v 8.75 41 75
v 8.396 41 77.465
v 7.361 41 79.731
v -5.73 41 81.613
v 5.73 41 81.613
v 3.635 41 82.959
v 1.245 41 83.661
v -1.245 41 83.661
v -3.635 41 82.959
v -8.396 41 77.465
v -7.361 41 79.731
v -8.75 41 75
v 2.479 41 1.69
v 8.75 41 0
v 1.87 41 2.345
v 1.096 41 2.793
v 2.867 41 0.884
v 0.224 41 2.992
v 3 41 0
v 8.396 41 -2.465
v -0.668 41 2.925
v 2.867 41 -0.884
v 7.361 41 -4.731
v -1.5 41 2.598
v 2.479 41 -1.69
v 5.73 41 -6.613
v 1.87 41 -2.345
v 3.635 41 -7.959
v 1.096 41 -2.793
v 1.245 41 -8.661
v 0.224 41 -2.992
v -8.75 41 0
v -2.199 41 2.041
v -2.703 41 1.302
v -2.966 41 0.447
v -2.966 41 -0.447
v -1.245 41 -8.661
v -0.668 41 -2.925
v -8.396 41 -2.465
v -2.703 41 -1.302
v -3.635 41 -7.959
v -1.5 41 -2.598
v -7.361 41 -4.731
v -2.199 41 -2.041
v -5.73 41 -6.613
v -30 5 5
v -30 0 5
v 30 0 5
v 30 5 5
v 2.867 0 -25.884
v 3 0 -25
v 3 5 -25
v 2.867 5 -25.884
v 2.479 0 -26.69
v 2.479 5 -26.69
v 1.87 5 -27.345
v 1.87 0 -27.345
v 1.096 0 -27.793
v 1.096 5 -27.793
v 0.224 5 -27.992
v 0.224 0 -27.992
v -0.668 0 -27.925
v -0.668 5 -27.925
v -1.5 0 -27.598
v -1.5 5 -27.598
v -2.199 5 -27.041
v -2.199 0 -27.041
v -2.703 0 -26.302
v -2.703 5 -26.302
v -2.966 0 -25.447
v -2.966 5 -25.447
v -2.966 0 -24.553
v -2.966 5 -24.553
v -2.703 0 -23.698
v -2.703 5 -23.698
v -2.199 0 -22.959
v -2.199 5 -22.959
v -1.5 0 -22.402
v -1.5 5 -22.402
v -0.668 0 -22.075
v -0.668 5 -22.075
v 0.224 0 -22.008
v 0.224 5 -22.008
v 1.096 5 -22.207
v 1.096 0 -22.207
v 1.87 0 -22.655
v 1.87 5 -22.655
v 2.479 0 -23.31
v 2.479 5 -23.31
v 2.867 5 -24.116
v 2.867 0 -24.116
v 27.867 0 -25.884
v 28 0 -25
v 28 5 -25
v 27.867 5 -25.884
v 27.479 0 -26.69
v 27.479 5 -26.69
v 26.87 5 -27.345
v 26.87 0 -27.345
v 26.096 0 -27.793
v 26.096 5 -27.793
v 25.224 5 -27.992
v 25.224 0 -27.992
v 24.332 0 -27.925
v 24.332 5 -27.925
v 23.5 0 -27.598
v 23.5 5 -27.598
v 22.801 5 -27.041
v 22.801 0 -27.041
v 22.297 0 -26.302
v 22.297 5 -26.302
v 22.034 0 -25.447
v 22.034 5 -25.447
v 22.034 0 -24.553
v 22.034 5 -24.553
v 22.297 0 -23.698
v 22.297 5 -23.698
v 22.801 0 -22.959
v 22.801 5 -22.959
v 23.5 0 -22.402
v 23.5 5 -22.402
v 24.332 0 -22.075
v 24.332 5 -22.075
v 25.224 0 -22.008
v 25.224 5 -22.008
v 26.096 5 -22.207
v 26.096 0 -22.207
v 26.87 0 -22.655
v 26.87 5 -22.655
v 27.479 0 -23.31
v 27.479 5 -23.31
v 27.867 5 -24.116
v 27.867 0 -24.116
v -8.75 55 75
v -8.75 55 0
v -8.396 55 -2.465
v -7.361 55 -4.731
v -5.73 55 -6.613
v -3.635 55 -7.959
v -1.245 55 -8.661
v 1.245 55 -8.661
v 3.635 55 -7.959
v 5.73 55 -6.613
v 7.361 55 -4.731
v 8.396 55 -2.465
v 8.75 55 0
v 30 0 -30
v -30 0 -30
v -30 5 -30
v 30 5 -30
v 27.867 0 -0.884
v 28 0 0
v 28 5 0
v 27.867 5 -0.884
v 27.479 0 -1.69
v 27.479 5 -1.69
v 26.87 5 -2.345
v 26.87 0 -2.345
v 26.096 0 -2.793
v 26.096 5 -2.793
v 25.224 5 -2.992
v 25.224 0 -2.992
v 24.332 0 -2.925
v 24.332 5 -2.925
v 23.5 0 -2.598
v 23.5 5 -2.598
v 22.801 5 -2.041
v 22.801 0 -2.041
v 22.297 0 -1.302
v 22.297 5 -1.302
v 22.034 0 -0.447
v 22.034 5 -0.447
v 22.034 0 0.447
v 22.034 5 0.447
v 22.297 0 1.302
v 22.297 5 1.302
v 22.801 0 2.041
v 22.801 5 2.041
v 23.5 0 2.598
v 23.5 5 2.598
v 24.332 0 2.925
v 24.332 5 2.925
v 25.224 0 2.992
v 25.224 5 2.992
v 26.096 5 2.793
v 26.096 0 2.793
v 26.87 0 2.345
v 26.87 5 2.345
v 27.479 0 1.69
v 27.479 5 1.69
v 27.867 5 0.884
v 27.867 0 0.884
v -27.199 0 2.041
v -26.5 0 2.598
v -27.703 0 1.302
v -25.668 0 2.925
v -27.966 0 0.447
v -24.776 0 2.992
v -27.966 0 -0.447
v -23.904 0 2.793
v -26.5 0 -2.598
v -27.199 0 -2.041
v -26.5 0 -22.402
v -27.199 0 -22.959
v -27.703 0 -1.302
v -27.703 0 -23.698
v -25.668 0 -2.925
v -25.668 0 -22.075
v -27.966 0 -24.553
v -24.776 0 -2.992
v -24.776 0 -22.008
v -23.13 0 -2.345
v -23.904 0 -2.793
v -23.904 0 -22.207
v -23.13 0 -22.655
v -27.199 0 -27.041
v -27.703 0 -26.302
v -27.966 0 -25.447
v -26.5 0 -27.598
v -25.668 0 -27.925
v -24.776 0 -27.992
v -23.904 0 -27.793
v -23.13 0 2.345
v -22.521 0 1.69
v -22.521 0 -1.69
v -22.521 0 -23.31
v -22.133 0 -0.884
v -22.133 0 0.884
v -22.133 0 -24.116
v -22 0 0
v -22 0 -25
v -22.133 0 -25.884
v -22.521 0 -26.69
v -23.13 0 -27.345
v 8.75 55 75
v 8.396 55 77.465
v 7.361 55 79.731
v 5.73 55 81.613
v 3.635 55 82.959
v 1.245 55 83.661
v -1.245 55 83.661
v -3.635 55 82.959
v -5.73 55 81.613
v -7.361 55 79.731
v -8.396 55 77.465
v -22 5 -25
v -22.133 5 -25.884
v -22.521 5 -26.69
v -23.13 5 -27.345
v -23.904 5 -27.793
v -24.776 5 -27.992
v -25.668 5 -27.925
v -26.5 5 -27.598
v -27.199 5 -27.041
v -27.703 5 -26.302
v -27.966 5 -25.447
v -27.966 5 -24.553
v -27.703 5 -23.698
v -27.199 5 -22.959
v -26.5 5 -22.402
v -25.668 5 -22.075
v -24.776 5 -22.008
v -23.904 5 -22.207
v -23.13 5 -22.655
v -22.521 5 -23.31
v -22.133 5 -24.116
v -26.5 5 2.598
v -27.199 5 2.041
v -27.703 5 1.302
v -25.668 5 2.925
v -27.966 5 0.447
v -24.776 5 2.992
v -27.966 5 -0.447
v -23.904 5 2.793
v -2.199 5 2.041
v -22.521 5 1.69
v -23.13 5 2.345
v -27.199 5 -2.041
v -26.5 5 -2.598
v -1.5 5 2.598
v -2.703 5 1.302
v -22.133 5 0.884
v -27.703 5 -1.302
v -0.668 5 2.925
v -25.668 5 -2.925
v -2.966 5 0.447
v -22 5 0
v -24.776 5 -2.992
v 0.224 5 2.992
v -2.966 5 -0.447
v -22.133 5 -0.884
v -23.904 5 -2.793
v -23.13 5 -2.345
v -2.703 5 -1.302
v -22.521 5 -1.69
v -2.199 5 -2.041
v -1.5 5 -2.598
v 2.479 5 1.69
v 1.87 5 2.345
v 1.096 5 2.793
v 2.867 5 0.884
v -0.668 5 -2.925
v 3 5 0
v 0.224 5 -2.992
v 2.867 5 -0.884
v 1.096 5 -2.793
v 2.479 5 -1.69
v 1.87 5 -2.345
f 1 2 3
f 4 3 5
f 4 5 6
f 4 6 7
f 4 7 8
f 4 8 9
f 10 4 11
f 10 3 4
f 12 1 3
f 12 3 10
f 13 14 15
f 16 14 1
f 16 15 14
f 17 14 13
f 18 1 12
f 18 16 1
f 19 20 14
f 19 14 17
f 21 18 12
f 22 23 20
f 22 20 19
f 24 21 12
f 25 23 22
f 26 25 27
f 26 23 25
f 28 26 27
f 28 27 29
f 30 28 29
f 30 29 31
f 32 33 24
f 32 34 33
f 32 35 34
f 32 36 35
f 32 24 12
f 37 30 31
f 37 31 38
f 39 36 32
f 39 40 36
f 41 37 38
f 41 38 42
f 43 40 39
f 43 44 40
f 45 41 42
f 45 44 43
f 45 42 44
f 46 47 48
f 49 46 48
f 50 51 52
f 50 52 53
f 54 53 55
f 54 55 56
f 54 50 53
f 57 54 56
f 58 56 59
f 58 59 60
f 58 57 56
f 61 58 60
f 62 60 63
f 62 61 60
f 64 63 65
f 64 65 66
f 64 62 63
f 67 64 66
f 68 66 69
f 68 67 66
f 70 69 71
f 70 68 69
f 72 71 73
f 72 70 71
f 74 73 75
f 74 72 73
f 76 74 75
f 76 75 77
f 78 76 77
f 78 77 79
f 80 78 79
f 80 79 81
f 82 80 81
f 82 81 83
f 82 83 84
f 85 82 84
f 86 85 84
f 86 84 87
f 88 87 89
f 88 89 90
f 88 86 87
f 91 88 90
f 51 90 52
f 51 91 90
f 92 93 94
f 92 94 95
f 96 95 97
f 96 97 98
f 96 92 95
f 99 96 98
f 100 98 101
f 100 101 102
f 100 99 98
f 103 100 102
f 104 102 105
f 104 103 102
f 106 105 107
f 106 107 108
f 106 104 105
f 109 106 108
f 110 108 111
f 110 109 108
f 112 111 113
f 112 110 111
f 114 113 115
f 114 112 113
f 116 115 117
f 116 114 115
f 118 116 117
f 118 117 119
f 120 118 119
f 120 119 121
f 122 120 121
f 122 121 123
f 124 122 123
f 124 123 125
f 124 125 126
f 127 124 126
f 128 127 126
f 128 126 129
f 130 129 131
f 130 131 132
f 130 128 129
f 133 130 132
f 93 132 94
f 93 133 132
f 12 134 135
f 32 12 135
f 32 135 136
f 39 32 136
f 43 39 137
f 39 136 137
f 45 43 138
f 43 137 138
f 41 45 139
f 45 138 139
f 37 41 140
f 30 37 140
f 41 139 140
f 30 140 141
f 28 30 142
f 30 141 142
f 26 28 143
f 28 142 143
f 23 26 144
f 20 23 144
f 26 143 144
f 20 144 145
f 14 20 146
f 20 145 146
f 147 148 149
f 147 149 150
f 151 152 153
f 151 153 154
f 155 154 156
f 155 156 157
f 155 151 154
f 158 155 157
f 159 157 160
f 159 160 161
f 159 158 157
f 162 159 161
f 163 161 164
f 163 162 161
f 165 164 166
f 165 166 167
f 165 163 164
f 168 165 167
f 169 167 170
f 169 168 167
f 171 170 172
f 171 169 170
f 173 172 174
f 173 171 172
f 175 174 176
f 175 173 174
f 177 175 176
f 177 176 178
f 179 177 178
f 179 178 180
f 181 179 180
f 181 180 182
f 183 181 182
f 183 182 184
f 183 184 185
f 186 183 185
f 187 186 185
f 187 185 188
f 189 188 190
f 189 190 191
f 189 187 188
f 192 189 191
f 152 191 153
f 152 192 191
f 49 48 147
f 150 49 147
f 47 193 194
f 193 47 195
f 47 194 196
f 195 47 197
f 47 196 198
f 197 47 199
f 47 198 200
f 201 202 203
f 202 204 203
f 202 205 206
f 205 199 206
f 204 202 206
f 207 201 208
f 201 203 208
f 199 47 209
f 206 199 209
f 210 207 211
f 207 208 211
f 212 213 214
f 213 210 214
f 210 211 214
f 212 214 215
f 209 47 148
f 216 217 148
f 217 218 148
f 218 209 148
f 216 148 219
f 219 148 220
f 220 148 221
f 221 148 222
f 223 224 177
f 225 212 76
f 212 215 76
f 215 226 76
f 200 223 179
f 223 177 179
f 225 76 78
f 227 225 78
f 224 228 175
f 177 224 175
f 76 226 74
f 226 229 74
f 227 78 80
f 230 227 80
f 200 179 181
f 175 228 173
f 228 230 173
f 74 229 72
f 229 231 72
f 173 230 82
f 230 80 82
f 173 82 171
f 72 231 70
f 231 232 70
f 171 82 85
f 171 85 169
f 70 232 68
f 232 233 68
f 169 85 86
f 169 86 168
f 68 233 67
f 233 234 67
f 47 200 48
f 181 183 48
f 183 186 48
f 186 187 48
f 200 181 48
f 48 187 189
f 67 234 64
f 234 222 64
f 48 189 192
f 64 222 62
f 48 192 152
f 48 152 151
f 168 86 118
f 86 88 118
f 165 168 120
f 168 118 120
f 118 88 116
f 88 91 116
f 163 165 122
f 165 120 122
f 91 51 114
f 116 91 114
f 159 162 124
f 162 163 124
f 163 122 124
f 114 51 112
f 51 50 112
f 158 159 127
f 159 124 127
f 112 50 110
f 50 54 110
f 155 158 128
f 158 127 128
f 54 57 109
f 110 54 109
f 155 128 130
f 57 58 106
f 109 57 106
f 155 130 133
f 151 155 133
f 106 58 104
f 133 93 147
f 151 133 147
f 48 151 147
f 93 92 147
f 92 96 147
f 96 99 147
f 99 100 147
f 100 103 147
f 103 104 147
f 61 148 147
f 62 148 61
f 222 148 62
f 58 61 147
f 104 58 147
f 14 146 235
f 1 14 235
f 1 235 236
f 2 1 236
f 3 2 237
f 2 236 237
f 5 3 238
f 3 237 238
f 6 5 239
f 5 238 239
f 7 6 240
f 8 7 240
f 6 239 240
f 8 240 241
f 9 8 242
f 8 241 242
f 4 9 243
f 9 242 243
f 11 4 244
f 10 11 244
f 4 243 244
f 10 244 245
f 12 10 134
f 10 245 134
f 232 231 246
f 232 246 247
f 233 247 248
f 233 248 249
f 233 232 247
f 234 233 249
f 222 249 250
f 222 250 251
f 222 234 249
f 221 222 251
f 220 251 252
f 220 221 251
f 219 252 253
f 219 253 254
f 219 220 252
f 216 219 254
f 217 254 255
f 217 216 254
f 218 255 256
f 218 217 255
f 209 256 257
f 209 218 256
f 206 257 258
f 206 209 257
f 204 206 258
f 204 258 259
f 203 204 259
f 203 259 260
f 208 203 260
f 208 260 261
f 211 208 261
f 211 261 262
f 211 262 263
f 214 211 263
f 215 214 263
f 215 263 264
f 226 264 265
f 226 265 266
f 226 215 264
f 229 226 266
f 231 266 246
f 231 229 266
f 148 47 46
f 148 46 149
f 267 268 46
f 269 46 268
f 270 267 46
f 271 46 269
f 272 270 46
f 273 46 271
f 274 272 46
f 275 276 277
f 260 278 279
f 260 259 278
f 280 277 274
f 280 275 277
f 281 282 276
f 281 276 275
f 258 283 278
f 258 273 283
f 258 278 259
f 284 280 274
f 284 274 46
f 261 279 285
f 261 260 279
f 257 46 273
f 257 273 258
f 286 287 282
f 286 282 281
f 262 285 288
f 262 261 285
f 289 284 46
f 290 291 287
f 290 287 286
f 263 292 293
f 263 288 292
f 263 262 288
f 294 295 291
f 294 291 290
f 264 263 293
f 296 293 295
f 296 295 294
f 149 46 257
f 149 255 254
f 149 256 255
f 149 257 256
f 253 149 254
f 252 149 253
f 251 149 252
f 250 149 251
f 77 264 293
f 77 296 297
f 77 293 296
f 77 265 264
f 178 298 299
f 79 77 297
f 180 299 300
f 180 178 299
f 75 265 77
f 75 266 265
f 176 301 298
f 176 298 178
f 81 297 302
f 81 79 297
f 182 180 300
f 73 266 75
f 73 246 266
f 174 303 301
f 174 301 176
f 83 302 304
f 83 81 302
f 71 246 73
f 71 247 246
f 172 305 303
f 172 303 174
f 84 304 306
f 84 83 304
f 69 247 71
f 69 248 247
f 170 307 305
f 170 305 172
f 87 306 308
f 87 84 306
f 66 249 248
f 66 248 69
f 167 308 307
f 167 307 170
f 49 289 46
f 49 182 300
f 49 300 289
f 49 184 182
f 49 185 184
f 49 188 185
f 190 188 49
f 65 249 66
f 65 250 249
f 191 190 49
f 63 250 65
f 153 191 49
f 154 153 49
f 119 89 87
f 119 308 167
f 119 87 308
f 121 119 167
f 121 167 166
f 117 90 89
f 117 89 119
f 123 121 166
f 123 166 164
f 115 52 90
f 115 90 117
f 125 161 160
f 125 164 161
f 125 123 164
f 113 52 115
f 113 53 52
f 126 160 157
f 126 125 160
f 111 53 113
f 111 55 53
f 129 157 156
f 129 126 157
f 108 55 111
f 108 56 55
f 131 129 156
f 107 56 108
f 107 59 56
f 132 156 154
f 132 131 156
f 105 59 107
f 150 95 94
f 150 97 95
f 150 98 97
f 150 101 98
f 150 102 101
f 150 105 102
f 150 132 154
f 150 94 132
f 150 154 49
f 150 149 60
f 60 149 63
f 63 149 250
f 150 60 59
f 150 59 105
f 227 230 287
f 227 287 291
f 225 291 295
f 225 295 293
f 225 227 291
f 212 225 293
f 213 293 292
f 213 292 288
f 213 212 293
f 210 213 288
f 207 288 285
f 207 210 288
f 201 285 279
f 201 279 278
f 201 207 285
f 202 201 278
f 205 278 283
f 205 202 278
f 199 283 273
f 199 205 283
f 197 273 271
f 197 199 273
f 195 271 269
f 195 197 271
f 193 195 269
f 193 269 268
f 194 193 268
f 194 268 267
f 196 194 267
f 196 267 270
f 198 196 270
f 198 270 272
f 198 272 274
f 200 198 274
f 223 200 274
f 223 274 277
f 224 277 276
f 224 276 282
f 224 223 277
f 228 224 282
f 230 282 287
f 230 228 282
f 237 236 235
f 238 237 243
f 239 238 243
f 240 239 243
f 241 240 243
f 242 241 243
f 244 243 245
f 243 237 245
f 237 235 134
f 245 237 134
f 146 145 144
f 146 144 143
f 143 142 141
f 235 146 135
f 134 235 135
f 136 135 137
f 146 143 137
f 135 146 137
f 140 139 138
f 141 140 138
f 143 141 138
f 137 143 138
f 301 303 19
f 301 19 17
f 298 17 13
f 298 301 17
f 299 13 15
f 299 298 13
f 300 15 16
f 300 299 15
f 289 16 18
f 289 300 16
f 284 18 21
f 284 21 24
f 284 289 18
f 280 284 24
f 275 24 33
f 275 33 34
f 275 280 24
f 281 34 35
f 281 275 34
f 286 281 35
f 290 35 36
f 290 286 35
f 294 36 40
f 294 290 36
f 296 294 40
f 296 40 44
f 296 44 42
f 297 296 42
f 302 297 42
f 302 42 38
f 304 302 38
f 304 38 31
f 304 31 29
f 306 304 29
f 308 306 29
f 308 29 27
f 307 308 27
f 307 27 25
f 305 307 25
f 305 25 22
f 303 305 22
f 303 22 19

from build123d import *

# Parameters (mm, degrees)
SKETCH_1_W      = 60
SKETCH_1_H      = 35
SKETCH_1_R      = 3
EXTRUDE_1_DEPTH = 5
SKETCH_2_R      = 3
EXTRUDE_2_DEPTH = 55
EXTRUDE_3_DEPTH = 14


with BuildPart() as part:
    # 스케치1 → 보스-돌출1 (new body)
    with BuildSketch(Plane(origin=(0, 0, 0), x_dir=(1, 0, 0), z_dir=(0, 1, 0))):
        with Locations((0, 12.5)):
            Rectangle(SKETCH_1_W, SKETCH_1_H)
        Circle(SKETCH_1_R, mode=Mode.SUBTRACT)
        with Locations((25, 0)):
            Circle(SKETCH_1_R, mode=Mode.SUBTRACT)
        with Locations((-25, 0)):
            Circle(SKETCH_1_R, mode=Mode.SUBTRACT)
        with Locations((25, 25)):
            Circle(SKETCH_1_R, mode=Mode.SUBTRACT)
        with Locations((0, 25)):
            Circle(SKETCH_1_R, mode=Mode.SUBTRACT)
        with Locations((-25, 25)):
            Circle(SKETCH_1_R, mode=Mode.SUBTRACT)
    extrude(amount=EXTRUDE_1_DEPTH)

    # 스케치2 → 보스-돌출2 (add)
    with BuildSketch(Plane.XZ):
        Circle(SKETCH_2_R)
    extrude(amount=-EXTRUDE_2_DEPTH)

    # 스케치3 → 보스-돌출3 (add)
    with BuildSketch(Plane(origin=(0, 55, 0), x_dir=(1, 0, 0), z_dir=(0, 1, 0))):
        with BuildLine():
            Line((8.75, 0), (8.75, -75))
            ThreePointArc((8.75, -75), (0, -83.75), (-8.75, -75))
            Line((-8.75, -75), (-8.75, 0))
            ThreePointArc((-8.75, 0), (0, 8.75), (8.75, 0))
        make_face()
    extrude(amount=-EXTRUDE_3_DEPTH)


solid = part.part
